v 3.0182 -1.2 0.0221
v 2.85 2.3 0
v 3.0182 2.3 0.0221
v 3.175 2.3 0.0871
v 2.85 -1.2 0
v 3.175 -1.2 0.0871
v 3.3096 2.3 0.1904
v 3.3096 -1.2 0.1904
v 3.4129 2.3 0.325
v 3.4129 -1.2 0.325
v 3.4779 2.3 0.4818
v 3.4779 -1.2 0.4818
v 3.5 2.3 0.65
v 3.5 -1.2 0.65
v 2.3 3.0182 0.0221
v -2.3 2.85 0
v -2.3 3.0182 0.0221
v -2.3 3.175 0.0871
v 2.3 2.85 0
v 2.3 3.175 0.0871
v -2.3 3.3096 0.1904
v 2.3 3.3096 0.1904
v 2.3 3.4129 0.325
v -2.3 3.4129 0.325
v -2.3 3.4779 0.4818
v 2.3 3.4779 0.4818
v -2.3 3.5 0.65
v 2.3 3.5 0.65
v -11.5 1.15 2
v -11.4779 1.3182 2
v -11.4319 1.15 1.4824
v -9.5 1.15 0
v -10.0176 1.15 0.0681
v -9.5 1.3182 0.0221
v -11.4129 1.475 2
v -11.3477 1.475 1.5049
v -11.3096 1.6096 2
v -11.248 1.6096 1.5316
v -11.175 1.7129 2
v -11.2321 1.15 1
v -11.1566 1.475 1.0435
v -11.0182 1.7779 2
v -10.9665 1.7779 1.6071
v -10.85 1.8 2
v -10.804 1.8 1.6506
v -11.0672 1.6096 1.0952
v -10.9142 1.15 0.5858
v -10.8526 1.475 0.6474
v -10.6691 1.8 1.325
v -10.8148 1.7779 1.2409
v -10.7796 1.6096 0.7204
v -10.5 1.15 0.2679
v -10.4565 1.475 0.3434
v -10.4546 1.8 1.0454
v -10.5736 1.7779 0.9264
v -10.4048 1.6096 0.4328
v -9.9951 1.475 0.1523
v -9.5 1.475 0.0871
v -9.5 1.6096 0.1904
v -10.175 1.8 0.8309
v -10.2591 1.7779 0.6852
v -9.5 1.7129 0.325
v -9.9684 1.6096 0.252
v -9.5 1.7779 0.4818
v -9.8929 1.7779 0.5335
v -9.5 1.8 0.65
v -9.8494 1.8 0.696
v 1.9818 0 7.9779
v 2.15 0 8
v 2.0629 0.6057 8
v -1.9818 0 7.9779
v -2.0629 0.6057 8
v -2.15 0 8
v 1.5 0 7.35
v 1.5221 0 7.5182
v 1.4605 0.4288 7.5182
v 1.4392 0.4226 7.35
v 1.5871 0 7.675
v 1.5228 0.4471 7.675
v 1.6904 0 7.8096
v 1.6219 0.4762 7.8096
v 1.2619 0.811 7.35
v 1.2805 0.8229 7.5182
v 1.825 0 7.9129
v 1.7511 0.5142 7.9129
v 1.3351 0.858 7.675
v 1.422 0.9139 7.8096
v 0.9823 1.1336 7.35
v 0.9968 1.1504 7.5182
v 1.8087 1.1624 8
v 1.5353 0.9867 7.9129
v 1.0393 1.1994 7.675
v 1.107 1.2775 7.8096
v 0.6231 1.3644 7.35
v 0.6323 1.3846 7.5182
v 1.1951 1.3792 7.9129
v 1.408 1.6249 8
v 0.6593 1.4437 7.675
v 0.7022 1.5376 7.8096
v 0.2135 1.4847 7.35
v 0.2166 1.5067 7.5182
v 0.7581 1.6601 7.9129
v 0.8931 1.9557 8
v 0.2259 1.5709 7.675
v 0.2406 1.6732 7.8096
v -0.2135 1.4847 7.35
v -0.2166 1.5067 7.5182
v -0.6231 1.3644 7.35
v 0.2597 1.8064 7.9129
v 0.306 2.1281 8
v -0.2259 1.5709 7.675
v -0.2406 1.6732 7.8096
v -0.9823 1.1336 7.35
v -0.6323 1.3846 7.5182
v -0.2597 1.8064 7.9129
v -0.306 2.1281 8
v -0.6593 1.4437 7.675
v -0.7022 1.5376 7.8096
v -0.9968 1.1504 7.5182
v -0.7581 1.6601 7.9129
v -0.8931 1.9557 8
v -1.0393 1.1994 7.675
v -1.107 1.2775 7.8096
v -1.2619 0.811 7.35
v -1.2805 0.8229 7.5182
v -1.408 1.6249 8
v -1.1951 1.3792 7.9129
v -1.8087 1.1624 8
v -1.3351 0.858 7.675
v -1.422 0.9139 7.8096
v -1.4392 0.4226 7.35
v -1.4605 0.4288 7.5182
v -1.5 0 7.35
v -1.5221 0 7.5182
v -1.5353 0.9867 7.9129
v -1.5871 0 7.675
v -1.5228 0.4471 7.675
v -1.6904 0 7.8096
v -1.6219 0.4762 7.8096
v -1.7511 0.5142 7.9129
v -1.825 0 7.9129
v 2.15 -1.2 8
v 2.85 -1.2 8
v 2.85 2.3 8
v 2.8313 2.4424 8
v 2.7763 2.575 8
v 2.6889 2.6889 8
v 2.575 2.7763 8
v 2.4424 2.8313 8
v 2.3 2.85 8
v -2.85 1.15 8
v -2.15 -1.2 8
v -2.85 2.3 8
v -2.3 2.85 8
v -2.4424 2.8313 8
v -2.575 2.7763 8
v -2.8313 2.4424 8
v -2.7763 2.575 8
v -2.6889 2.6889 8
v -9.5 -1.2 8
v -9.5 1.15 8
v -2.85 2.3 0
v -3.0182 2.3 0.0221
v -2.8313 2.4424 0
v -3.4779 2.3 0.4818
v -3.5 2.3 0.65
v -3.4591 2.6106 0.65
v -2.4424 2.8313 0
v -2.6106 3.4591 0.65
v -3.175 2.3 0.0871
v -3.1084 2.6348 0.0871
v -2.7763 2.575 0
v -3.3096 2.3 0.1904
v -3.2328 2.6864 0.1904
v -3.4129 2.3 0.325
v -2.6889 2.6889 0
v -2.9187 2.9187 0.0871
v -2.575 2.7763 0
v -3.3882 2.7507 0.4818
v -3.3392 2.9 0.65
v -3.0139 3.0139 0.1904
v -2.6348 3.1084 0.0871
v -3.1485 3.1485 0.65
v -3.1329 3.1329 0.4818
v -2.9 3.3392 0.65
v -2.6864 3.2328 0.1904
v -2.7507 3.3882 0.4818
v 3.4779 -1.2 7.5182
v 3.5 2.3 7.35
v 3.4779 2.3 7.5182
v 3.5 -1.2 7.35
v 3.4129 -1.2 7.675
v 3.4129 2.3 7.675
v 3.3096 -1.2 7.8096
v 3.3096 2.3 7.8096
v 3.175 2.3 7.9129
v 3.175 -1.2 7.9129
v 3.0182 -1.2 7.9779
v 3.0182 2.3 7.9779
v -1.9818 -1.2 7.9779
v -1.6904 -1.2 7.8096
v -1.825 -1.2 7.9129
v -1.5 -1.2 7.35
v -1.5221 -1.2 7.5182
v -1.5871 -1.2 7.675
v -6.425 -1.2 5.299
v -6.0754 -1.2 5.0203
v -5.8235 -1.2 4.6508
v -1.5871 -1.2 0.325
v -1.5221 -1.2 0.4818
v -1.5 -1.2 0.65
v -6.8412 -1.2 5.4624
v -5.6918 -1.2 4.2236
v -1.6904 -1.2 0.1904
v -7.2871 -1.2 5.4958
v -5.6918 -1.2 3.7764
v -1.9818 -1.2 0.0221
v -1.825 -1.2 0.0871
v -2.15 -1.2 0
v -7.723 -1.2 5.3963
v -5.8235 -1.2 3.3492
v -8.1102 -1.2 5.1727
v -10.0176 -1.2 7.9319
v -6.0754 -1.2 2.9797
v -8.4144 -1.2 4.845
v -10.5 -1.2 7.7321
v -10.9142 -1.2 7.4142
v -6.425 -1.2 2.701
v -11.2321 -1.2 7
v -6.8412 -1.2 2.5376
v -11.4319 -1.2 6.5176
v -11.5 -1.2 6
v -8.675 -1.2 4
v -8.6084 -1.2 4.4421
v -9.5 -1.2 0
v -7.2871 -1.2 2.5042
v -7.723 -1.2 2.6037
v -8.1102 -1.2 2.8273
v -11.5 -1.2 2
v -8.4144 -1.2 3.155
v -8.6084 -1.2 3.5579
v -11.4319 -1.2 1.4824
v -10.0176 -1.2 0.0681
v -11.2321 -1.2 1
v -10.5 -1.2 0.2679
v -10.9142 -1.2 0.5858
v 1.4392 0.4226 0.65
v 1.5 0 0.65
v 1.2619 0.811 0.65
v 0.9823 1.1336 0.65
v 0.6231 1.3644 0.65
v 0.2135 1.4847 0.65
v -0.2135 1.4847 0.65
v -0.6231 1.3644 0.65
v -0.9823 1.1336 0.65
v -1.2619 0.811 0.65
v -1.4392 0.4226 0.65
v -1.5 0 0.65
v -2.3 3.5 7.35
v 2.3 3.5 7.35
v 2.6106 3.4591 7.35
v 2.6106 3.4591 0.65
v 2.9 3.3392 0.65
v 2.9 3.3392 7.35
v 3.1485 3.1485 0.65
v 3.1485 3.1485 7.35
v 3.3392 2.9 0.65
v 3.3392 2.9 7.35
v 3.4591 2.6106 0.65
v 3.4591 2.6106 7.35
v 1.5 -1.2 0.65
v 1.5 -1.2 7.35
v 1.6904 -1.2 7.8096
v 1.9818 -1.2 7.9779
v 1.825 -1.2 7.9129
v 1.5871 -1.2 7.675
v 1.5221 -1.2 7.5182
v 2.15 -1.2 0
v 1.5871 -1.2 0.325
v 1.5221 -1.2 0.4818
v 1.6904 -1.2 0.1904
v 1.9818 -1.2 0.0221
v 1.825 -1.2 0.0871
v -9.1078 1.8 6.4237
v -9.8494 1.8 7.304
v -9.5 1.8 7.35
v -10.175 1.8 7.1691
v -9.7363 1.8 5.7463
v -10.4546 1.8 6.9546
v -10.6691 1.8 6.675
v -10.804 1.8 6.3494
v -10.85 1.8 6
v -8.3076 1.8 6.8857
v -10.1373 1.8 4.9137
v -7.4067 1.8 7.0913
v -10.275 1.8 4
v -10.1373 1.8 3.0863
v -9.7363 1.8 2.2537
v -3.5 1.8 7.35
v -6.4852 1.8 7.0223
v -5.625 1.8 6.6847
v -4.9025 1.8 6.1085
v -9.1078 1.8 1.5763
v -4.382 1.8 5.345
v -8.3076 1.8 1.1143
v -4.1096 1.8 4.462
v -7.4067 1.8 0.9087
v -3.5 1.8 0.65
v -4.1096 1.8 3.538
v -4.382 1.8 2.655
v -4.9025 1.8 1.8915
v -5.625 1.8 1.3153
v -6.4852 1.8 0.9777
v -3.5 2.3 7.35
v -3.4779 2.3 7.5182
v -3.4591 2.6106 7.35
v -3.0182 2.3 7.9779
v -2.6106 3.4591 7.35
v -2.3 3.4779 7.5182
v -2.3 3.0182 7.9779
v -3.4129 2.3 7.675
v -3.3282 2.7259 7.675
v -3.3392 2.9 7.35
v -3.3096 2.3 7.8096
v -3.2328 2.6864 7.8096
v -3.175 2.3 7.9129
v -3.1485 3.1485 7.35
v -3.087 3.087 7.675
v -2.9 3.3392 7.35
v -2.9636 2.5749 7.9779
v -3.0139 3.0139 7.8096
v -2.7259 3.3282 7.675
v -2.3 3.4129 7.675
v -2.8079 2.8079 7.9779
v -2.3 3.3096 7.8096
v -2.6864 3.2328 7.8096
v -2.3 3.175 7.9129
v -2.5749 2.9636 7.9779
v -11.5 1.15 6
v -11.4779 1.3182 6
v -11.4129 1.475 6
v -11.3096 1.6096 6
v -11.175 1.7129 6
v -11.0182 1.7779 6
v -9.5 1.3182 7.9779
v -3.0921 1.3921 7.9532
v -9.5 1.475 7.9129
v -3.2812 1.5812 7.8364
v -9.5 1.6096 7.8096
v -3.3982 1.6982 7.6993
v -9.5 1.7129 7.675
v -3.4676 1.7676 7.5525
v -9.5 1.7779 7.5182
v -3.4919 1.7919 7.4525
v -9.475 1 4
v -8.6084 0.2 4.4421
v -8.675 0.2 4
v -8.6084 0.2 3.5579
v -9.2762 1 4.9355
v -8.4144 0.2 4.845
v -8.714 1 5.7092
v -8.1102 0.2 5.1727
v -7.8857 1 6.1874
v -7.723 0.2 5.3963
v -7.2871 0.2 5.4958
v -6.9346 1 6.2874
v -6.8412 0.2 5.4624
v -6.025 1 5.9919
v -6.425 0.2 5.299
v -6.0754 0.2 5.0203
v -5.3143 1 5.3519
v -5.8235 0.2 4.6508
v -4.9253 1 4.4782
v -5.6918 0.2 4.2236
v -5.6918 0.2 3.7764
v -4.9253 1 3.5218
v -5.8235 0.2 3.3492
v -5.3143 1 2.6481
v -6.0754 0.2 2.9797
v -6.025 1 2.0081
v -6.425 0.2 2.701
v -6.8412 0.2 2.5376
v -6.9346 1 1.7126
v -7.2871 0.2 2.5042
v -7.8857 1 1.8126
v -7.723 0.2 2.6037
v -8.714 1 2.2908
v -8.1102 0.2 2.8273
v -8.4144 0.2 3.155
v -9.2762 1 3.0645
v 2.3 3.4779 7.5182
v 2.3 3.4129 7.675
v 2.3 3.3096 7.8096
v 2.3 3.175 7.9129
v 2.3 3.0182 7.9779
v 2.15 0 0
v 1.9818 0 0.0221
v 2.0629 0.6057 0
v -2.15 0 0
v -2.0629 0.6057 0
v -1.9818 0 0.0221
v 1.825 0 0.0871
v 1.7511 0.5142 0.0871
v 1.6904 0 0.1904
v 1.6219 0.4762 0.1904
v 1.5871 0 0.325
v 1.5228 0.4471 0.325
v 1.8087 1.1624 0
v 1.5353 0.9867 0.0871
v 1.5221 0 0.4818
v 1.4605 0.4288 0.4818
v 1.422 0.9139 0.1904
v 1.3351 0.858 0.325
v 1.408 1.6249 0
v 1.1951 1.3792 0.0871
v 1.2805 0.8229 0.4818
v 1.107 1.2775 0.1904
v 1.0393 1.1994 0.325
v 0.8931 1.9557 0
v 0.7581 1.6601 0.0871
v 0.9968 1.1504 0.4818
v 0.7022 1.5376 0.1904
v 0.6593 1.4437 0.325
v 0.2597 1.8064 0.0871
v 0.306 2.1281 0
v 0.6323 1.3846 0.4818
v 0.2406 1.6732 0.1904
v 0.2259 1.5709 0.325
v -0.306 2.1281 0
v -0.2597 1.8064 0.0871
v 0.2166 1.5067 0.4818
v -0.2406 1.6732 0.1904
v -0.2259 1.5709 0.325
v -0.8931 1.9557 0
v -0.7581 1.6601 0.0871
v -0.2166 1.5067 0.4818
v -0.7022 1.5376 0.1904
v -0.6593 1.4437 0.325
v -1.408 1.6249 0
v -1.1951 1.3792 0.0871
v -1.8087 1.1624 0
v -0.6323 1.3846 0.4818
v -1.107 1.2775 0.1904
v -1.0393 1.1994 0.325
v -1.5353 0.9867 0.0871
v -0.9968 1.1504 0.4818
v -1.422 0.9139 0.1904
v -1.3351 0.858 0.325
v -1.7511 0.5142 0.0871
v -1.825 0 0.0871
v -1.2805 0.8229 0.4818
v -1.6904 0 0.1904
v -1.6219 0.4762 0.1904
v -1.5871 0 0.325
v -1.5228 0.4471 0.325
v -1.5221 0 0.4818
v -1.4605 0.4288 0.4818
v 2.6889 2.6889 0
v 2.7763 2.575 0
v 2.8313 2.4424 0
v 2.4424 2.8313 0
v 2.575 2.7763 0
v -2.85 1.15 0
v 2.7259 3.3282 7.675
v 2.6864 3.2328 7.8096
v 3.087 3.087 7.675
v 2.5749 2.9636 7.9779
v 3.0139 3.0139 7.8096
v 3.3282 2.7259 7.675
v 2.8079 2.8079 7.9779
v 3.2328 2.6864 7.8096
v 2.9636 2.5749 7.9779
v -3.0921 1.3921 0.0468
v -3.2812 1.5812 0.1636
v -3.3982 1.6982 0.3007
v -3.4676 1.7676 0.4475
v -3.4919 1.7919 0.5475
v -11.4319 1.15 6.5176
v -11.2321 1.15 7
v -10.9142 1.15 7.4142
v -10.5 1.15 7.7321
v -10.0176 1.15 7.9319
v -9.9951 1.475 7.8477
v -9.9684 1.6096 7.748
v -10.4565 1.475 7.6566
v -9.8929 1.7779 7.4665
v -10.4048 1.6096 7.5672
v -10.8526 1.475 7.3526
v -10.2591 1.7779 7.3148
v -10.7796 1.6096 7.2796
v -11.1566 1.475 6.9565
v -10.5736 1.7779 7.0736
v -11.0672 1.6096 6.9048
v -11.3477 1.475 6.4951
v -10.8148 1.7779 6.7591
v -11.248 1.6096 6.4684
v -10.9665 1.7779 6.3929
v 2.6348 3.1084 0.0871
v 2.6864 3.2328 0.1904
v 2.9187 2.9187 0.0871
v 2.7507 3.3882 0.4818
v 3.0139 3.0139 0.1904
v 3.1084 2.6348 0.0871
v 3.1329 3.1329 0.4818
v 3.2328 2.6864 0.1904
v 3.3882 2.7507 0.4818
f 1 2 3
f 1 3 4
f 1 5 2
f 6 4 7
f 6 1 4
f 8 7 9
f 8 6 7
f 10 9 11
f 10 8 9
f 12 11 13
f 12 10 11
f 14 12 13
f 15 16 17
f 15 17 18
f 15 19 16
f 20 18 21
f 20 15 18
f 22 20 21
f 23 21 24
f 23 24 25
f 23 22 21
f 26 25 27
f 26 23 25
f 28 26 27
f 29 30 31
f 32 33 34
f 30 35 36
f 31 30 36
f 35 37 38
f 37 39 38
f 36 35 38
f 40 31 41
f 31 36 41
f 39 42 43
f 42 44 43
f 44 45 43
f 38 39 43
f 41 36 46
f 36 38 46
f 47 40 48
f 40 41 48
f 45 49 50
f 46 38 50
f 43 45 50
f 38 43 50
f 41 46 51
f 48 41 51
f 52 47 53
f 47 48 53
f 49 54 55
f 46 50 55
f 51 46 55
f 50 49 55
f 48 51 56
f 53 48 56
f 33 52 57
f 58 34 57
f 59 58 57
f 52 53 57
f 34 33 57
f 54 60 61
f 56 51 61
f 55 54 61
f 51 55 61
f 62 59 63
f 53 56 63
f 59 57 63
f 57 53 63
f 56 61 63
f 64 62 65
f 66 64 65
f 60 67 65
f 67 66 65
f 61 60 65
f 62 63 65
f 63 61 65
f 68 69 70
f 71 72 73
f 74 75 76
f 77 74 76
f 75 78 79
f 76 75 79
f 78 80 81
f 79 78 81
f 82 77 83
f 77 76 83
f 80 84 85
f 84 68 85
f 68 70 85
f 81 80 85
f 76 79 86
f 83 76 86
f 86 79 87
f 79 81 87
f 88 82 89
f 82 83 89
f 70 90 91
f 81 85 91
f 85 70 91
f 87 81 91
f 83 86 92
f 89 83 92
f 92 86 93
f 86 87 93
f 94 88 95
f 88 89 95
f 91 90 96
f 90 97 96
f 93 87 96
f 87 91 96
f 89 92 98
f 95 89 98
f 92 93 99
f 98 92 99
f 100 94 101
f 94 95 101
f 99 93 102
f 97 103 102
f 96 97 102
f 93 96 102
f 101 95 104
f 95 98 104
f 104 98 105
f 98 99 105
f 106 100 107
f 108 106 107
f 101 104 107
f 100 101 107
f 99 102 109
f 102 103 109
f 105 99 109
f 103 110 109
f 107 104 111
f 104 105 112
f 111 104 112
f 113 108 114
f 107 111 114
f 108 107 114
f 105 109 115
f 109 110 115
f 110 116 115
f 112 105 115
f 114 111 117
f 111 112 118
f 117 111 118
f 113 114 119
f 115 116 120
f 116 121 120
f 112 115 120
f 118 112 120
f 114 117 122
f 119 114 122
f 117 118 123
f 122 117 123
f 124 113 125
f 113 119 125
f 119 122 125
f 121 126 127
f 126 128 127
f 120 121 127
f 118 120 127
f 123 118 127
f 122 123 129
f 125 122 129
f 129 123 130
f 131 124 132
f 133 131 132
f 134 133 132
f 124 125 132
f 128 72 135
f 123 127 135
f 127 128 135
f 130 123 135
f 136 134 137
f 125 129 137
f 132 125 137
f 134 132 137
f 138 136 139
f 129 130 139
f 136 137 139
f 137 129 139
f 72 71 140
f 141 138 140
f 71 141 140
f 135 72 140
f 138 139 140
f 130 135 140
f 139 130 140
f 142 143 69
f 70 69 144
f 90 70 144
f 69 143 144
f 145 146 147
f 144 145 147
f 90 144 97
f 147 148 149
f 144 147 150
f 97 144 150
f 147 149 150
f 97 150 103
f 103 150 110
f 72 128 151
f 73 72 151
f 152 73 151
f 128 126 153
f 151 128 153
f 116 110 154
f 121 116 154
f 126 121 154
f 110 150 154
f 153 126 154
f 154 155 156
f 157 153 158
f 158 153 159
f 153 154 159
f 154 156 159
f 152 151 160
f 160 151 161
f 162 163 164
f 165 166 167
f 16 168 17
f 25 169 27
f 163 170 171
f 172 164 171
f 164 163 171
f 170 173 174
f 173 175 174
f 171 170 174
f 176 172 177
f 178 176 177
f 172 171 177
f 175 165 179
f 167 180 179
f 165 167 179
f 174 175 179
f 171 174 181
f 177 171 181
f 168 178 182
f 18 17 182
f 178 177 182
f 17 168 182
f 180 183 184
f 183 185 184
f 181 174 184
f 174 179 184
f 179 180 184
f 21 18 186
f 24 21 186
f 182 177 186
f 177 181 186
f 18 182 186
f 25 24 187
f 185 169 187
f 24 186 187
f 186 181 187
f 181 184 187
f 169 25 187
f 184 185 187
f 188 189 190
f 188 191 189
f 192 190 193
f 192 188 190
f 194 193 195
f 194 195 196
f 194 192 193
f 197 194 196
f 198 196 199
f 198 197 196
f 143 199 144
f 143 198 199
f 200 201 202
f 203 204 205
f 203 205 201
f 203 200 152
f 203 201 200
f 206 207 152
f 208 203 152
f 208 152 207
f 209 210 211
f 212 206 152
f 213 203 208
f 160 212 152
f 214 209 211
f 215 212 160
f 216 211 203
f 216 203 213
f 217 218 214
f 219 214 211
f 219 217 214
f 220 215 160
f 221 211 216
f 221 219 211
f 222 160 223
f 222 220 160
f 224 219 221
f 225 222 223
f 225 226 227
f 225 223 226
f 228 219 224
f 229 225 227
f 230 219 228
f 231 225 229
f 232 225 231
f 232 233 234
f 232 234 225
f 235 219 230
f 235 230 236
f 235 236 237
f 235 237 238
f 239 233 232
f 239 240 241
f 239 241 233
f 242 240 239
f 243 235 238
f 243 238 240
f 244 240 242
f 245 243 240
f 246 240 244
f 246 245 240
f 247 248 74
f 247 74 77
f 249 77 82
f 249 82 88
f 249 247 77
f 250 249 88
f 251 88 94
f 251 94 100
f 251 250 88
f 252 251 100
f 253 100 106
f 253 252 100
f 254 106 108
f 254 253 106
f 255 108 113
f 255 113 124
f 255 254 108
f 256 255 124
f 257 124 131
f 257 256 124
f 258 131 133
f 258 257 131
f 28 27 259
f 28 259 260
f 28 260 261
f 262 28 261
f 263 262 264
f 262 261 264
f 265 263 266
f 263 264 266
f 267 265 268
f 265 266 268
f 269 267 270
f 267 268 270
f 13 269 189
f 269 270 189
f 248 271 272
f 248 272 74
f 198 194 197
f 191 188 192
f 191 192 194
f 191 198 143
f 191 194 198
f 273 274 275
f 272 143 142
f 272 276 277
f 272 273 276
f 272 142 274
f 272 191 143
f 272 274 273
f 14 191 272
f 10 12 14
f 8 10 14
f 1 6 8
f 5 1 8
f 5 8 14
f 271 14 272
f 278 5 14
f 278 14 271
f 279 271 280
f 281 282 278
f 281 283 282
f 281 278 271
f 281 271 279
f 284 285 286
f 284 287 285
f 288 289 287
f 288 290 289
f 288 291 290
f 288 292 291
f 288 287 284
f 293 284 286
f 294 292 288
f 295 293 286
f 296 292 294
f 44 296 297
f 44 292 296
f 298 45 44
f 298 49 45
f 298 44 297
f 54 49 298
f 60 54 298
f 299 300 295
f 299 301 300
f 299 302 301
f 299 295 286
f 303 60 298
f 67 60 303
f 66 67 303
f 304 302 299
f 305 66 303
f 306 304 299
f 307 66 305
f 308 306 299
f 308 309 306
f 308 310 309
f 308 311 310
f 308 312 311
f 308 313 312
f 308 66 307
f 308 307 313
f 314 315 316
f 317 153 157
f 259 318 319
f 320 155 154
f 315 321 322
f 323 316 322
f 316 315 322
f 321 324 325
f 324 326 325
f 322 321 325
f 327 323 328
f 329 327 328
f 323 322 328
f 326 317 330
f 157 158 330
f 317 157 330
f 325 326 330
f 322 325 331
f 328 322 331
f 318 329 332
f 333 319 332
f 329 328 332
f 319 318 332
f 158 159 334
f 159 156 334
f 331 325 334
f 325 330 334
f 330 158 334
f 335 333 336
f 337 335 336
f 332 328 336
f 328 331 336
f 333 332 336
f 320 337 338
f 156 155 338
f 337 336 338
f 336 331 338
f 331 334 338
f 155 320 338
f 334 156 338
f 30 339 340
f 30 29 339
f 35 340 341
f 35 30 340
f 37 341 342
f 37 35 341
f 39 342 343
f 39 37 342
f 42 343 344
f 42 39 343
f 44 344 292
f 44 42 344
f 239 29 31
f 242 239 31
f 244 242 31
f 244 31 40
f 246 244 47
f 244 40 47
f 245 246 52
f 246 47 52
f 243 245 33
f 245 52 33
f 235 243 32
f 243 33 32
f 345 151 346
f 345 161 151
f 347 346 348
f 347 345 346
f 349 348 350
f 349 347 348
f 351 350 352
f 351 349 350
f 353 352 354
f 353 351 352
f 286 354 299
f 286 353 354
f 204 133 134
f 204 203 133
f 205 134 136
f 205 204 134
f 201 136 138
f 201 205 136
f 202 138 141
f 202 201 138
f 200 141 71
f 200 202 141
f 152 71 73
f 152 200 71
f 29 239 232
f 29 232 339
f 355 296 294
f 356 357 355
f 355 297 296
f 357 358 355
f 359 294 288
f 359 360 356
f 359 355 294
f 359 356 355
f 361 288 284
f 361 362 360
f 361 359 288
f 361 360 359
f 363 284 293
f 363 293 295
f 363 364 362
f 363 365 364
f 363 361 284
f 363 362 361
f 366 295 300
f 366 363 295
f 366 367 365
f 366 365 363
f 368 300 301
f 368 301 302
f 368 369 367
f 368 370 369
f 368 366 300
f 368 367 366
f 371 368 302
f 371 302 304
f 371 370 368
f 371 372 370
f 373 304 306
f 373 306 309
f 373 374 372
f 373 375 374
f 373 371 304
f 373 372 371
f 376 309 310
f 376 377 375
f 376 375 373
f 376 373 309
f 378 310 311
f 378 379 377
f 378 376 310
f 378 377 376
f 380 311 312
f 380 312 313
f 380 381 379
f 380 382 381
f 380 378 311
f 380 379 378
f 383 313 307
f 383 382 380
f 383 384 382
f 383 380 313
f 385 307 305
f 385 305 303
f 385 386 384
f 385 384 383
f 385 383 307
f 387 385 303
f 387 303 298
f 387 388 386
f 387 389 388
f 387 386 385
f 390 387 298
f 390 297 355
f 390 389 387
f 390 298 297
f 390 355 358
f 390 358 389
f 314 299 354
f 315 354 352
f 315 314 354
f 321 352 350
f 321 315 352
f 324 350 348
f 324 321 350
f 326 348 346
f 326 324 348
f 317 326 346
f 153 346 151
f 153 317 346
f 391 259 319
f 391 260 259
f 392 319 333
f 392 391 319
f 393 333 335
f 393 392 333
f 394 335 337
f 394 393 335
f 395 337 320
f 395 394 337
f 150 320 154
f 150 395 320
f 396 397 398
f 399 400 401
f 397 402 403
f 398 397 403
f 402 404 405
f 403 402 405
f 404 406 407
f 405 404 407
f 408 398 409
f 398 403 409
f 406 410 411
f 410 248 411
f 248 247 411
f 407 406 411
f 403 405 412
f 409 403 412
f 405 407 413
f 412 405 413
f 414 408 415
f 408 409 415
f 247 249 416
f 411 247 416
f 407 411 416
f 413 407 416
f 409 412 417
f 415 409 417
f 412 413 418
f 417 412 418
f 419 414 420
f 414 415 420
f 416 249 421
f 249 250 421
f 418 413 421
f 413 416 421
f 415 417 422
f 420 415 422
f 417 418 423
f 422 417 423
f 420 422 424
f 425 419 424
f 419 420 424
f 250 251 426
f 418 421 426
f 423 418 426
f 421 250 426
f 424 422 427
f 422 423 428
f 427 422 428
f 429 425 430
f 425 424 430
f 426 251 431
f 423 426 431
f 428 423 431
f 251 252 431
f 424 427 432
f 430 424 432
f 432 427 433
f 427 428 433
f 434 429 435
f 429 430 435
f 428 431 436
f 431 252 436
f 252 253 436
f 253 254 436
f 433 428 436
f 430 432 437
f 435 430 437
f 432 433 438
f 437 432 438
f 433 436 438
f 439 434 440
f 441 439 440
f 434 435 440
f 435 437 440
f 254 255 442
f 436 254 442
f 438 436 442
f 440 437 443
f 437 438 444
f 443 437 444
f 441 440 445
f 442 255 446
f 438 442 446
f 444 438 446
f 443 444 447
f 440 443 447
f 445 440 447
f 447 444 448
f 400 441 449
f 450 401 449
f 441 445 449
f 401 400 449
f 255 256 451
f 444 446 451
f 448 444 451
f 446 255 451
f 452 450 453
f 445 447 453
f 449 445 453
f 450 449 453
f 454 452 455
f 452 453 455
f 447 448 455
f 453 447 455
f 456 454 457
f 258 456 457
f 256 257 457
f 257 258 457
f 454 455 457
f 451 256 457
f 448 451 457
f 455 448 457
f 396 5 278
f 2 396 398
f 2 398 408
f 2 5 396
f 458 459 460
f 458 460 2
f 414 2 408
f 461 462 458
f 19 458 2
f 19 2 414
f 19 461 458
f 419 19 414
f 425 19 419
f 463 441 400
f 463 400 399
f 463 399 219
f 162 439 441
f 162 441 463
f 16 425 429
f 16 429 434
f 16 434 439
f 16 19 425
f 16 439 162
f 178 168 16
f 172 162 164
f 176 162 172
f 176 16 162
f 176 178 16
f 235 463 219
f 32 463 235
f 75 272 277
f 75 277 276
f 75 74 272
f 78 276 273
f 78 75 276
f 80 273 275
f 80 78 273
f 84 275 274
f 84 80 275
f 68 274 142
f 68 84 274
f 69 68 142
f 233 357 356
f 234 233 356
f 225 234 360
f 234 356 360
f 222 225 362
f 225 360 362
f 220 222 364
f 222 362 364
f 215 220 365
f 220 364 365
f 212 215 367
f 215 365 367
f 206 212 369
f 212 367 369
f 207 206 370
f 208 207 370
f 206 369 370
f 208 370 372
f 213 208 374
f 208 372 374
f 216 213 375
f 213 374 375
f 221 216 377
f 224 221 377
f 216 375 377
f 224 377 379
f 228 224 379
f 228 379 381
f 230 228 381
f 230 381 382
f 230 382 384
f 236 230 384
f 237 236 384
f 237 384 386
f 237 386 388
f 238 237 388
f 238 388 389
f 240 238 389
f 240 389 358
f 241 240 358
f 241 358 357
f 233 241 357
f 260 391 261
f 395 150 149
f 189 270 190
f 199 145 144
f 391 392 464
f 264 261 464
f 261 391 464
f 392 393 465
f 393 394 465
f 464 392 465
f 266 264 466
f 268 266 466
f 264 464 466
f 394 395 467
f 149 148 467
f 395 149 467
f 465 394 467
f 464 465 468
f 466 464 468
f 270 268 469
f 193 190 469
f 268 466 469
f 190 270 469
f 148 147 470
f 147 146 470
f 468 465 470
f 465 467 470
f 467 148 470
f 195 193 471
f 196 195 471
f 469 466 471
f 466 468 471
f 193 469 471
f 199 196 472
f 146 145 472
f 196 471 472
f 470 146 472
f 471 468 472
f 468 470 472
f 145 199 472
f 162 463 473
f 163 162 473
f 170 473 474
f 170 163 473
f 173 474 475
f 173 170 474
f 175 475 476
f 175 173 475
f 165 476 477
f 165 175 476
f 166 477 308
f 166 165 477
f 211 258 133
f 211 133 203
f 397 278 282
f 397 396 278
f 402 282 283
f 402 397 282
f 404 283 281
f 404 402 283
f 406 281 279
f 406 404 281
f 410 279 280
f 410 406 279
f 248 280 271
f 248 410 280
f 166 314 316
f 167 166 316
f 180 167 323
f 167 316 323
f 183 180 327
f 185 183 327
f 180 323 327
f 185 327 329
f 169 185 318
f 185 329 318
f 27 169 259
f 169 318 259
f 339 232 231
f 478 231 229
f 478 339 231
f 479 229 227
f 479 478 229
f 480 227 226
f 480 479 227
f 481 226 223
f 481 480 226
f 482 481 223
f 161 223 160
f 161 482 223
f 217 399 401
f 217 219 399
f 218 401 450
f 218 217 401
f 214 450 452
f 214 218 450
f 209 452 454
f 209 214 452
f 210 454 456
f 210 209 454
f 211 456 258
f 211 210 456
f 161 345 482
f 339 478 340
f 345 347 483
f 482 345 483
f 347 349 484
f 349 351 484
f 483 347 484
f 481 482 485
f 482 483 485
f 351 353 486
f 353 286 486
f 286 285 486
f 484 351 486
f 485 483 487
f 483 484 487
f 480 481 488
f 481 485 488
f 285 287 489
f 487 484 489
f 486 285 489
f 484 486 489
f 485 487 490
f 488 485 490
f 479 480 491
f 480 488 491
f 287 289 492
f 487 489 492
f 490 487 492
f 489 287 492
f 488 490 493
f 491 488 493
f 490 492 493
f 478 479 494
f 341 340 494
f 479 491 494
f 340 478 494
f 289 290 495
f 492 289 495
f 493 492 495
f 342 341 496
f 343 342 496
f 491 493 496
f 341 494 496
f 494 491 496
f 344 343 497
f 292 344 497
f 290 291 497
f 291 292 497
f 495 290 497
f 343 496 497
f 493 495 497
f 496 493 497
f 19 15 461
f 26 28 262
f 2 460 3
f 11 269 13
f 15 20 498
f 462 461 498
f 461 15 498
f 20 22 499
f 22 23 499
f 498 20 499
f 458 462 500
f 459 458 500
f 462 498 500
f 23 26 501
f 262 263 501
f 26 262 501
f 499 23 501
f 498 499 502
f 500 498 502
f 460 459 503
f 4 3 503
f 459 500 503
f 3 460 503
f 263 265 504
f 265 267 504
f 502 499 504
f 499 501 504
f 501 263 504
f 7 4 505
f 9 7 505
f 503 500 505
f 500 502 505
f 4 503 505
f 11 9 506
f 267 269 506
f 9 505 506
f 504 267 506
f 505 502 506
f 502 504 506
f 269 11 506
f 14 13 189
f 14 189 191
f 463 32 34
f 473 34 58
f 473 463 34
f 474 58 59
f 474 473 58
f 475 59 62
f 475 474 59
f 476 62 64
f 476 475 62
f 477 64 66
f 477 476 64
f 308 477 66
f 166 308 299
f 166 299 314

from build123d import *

# Parameters (mm, degrees)
RESSALTO_EXTRUS_O1_DEPTH = 8
ESBO_O2_R                = 1.5
CORTE_EXTRUS_O1_DEPTH    = 6
CHANFRO2_SIZE            = 1.6
FILETE3_R                = 2
FILETE5_R                = 1.2
FILETE6_R                = 0.65


with BuildPart() as part:
    # Esboço1 → Ressalto-extrusão1 (new body)
    with BuildSketch(Plane.XY):
        with BuildLine():
            Line((-11.5, -1.2), (-11.5, 1.8))
            Line((-11.5, 1.8), (-3.5, 1.8))
            Line((-3.5, 1.8), (-3.5, 3.5))
            Line((-3.5, 3.5), (3.5, 3.5))
            Line((3.5, 3.5), (3.5, -1.2))
            Line((3.5, -1.2), (1.5, -1.2))
            Line((1.5, -1.2), (1.5, 0))
            ThreePointArc((1.5, 0), (0, 1.5), (-1.5, 0))
            Line((-1.5, 0), (-1.5, -1.2))
            Line((-1.5, -1.2), (-11.5, -1.2))
        make_face()
    extrude(amount=RESSALTO_EXTRUS_O1_DEPTH)

    # Esboço2 → Corte-extrusão1 (cut)
    with BuildSketch(Plane(origin=(0, 1.8, 0), x_dir=(1, 0, 0), z_dir=(0, 1, 0))):
        with Locations(Location((-7.175, -4, 0), (0, 0, 180))):
            Circle(ESBO_O2_R)
    extrude(amount=-CORTE_EXTRUS_O1_DEPTH, mode=Mode.SUBTRACT)

    # Chanfro2
    chanfro2_edges = [part.edges().sort_by_distance(p)[0] for p in [
        (-5.675, 1.8, 4),
    ]]
    chamfer(chanfro2_edges, length=CHANFRO2_SIZE)

    # Filete3
    filete3_edges = [part.edges().sort_by_distance(p)[0] for p in [
        (-11.5, 0.3, 0),
        (-11.5, 0.3, 8),
    ]]
    fillet(filete3_edges, radius=FILETE3_R)

    # Filete5
    filete5_edges = [part.edges().sort_by_distance(p)[0] for p in [
        (-3.5, 3.5, 4),
        (3.5, 3.5, 4),
    ]]
    fillet(filete5_edges, radius=FILETE5_R)

    # Filete6
    filete6_edges = [part.edges().sort_by_distance(p)[0] for p in [
        (-1.5, -0.6, 0),
        (-6.5, 1.8, 0),
        (3.5, 0.55, 0),
        (1.5, -0.6, 0),
        (0, 1.5, 0),
        (3.5, 0.55, 8),
        (-6.5, 1.8, 8),
        (-1.5, -0.6, 8),
        (-11.5, 1.8, 4),
        (-10.914213562, 1.8, 0.585786438),
        (-10.914213562, 1.8, 7.414213562),
        (0, 1.5, 8),
        (-3.5, 2.05, 0),
        (-3.5, 2.05, 8),
        (0, 3.5, 0),
        (3.148528137, 3.148528137, 0),
        (-3.148528137, 3.148528137, 0),
        (0, 3.5, 8),
        (3.148528137, 3.148528137, 8),
        (-3.148528137, 3.148528137, 8),
        (1.5, -0.6, 8),
    ]]
    fillet(filete6_edges, radius=FILETE6_R)


solid = part.part
